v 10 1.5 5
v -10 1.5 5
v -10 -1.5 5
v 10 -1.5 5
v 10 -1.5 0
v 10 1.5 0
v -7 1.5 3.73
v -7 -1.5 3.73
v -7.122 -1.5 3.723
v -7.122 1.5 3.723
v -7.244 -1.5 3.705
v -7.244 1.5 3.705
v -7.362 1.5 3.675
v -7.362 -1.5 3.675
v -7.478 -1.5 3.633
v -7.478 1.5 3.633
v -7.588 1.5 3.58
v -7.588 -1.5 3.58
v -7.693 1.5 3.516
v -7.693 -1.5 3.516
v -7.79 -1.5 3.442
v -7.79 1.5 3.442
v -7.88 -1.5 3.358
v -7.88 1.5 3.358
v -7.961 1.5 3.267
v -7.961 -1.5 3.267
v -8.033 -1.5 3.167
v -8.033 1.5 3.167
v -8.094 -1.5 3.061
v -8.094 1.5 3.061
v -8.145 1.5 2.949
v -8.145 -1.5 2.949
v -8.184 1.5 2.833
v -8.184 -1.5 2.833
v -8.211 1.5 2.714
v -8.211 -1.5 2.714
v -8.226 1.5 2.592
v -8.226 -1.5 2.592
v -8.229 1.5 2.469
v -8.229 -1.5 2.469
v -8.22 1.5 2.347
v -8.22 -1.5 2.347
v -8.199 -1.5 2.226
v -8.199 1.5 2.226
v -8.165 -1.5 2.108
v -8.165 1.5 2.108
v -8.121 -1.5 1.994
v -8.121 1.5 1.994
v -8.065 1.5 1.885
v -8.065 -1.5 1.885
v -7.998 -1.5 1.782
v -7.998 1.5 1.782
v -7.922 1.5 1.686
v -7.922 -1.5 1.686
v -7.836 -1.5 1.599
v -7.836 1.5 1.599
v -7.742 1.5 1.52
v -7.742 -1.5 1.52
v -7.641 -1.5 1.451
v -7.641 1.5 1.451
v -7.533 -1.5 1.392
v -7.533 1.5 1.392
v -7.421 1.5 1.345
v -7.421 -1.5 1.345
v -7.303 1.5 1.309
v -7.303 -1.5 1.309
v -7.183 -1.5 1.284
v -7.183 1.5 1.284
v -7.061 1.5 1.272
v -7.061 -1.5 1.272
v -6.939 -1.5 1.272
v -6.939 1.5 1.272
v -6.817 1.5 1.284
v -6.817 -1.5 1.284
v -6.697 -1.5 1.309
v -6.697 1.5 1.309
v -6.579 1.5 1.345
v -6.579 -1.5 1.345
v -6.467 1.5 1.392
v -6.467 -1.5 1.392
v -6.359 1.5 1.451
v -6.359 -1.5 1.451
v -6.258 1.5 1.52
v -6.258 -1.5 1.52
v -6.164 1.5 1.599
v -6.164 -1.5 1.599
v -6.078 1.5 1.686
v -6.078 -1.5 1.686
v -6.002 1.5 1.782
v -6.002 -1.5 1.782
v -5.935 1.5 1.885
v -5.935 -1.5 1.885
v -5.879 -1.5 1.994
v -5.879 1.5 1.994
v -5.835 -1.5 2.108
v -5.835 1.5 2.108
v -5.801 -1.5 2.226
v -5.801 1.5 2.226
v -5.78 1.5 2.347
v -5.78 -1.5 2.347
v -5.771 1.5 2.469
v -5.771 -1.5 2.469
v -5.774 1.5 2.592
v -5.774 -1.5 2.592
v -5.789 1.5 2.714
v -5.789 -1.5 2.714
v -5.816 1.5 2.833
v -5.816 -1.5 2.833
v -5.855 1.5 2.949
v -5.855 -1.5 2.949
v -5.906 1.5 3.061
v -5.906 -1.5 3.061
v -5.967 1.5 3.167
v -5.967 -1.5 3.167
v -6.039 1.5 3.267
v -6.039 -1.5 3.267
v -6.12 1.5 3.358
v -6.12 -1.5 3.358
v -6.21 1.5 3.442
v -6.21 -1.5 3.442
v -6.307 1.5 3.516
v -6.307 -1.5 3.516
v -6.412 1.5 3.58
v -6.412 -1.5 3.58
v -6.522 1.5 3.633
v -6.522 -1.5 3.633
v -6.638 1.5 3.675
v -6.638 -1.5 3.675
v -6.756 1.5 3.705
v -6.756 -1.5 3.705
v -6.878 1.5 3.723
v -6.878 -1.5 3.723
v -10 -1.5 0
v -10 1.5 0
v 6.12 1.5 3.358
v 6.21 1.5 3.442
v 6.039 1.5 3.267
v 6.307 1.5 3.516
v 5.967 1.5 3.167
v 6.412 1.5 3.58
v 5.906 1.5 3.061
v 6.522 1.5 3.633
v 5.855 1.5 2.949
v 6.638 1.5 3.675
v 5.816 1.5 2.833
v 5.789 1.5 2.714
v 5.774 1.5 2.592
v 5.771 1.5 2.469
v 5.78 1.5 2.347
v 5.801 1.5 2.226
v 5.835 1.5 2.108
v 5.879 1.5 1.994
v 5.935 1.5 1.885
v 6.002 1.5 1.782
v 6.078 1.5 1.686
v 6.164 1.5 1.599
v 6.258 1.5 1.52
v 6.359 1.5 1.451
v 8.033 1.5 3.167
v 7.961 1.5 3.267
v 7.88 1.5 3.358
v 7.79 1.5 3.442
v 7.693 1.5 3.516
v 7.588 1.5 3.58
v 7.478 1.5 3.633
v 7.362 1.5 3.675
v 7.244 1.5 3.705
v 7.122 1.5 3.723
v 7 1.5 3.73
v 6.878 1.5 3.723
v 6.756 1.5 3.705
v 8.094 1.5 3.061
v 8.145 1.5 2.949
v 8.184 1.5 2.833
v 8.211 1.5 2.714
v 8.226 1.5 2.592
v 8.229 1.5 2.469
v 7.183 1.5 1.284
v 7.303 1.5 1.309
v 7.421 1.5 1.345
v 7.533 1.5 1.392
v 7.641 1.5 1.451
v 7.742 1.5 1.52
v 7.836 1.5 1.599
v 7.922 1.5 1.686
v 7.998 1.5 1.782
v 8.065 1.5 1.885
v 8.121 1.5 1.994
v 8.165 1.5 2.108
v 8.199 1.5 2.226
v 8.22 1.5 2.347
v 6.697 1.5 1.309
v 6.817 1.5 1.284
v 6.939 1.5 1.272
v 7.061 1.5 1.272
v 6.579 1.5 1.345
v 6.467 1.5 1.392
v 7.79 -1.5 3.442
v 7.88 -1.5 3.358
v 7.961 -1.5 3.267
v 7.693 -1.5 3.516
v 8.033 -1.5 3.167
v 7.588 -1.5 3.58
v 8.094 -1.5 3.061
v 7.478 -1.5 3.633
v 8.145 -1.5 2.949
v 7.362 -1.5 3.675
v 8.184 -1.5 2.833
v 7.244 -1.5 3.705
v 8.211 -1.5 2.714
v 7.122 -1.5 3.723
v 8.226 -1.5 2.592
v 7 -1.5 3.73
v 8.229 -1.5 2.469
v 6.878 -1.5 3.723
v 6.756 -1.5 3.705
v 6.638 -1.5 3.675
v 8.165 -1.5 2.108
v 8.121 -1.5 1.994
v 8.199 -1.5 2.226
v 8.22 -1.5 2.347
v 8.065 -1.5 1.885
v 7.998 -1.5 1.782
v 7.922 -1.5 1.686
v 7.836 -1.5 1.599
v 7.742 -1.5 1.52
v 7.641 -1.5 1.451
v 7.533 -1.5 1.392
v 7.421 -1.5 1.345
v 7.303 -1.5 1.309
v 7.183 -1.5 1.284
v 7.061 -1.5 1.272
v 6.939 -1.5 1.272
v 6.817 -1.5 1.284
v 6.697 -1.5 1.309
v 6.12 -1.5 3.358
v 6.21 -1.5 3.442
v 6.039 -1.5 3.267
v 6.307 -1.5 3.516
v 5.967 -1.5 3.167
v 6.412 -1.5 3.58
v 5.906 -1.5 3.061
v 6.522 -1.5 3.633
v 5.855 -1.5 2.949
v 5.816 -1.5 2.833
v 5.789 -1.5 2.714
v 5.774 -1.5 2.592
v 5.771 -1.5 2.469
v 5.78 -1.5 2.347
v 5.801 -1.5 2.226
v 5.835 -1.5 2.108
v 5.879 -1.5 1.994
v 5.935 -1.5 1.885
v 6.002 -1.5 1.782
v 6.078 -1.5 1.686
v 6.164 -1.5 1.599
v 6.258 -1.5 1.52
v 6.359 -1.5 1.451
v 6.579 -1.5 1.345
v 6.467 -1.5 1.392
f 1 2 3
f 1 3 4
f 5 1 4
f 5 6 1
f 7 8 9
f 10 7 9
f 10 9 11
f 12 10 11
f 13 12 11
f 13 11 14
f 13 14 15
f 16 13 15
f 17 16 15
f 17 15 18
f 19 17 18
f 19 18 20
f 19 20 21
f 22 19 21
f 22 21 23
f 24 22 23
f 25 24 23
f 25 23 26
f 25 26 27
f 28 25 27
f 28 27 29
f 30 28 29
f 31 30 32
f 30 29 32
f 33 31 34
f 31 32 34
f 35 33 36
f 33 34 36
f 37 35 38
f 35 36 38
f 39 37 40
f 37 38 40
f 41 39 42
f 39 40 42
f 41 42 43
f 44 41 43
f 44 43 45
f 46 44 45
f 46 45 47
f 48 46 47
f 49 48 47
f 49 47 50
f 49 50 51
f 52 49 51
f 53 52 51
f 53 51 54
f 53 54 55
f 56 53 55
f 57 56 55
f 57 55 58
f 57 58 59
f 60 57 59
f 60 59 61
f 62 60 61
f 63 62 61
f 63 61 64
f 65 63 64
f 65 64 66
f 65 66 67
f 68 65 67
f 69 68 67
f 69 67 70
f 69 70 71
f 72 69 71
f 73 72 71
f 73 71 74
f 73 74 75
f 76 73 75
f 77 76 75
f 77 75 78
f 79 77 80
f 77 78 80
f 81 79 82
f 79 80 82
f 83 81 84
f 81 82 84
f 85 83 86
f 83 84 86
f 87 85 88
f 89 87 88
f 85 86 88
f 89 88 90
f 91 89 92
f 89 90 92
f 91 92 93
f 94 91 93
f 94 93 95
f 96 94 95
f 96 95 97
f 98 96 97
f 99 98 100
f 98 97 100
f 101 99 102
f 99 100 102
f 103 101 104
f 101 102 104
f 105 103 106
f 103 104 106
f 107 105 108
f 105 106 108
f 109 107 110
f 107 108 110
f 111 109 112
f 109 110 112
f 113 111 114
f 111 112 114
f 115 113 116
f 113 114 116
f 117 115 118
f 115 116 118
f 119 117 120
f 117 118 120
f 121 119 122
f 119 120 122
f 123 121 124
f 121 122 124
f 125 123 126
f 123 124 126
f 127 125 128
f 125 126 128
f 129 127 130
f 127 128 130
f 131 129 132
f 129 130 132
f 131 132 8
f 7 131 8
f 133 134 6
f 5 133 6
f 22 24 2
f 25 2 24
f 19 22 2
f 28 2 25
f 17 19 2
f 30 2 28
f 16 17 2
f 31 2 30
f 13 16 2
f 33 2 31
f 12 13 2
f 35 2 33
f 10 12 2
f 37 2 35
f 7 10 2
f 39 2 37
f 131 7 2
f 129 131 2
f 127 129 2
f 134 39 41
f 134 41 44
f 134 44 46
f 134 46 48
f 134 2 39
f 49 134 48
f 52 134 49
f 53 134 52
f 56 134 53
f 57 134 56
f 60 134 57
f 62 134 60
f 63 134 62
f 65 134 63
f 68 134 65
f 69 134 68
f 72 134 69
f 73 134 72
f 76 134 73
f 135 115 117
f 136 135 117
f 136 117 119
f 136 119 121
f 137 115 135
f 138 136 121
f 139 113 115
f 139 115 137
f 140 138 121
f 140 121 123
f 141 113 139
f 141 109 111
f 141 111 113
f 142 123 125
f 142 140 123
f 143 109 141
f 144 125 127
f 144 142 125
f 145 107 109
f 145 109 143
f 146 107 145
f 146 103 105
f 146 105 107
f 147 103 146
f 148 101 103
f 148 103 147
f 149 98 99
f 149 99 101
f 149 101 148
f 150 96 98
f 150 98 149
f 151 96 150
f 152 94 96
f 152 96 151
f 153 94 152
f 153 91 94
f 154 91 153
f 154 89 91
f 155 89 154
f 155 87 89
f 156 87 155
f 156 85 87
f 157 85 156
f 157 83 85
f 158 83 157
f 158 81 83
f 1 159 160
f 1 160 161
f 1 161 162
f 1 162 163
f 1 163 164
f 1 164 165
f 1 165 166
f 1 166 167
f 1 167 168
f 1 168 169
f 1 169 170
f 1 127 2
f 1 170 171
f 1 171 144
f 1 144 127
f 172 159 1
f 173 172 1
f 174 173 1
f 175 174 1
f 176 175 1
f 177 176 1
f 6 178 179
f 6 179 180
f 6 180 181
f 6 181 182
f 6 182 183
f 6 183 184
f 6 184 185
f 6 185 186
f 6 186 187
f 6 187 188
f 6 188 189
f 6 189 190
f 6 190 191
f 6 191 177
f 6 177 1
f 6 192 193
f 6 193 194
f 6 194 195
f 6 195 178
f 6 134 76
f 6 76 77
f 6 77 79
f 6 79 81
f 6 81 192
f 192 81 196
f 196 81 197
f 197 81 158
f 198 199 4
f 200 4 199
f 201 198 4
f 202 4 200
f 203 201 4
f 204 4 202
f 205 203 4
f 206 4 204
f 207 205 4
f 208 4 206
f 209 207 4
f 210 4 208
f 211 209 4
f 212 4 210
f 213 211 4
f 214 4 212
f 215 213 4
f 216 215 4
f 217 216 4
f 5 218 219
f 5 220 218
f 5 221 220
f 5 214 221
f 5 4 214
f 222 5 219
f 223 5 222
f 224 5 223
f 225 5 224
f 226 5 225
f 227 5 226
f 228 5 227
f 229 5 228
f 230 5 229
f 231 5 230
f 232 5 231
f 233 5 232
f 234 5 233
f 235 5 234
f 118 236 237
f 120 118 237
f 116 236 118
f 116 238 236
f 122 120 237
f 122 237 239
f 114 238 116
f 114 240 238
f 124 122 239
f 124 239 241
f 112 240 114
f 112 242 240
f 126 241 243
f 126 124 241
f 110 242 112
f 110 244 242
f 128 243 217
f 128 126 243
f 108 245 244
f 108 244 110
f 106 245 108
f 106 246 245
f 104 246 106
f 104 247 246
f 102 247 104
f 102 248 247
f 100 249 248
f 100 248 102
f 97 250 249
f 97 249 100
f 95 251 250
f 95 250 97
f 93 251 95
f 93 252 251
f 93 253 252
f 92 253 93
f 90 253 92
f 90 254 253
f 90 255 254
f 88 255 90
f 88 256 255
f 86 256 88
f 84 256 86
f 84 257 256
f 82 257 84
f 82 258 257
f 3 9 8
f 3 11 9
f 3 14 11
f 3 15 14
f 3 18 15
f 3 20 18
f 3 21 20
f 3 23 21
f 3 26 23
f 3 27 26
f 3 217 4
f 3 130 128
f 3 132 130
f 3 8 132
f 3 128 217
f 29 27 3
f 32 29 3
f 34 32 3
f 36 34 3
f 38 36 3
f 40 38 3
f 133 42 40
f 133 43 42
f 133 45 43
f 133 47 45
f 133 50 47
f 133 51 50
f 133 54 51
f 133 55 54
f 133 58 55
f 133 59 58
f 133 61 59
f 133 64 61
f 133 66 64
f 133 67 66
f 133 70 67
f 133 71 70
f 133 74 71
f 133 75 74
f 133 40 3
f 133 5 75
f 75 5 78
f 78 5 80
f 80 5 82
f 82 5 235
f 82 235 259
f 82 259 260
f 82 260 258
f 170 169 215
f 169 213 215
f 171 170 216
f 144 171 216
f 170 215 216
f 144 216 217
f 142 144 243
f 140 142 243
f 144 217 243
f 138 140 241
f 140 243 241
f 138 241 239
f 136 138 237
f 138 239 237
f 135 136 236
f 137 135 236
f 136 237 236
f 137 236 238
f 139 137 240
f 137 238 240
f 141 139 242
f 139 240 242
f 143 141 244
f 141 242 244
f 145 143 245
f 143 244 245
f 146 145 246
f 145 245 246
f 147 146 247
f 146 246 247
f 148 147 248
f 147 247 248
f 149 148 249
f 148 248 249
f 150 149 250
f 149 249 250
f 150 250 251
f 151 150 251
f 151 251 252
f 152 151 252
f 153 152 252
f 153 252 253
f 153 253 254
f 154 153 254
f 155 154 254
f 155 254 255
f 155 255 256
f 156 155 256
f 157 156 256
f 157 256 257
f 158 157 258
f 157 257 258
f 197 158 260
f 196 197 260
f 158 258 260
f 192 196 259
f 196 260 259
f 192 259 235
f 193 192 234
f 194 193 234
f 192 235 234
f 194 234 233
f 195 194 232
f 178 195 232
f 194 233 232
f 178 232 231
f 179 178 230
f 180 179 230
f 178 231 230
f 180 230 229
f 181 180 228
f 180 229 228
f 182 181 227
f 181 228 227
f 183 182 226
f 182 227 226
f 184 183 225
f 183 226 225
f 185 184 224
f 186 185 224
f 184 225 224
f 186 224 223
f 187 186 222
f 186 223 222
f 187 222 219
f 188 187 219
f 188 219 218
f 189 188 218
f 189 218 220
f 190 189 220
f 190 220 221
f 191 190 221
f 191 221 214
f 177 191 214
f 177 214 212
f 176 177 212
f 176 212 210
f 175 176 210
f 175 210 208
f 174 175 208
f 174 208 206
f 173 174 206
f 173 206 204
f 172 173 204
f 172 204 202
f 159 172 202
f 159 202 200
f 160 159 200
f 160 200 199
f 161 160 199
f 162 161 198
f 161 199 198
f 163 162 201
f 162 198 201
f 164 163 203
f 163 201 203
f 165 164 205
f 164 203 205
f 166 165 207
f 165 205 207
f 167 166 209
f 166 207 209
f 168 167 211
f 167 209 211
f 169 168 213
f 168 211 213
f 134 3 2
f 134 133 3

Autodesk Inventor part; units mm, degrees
ref_plane "YZ Plane" through (0, 0, 0) normal (1, 0, 0) x (0, 1, 0)
ref_plane "XZ Plane" through (0, 0, 0) normal (0, 1, 0) x (-1, 0, 0)
ref_plane "XY Plane" through (0, 0, 0) normal (0, 0, 1) x (1, 0, 0)
sketch "スケッチ1" plane through (0, 0, 0) normal (0, 0, 1) x (1, 0, 0)
  line L0 (-10, 1.5) -> (10, 1.5)
  line L1 (10, 1.5) -> (10, -1.5)
  line L2 (10, -1.5) -> (-10, -1.5)
  line L3 (-10, -1.5) -> (-10, 1.5)
  line L4 (-10, 1.5) -> (10, -1.5) construction
  line L5 (10, 1.5) -> (-10, -1.5) construction
  point P0 (0, 0)
  dimension "d0" = 20
  dimension "d1" = 3
extrude "押し出し1" add sketch "スケッチ1" along normal blind 5
sketch "スケッチ2" plane through (-10, 1.5, 0) normal (0, 1, 0) x (1, 0, 0)
  line L0 (0, 0) -> (20, 0) projected
  line L1 (0, 0) -> (0, -5) projected
  line L2 (20, -5) -> (0, -5) projected
  line L3 (20, 0) -> (20, -5) projected
  line L4 (17, -2.5) -> (3, -2.5)
  line L5 (0, 0) -> (0, -5) projected
  point P0 (10, 0)
  point P1 (10, -5)
  point P2 (10, -2.5)
  point P3 (0, -2.5)
  dimension "d4" = 14
hole "穴1" at (-7, 1.5, 2.5) at (7, 1.5, 2.5) direction (0, -1, 0) diameter 2.459 depth 8.8 tip angle 118 thread size "M3x0.5" class "6H" standard "ISO Metric profile"
properties part number "Key1"
